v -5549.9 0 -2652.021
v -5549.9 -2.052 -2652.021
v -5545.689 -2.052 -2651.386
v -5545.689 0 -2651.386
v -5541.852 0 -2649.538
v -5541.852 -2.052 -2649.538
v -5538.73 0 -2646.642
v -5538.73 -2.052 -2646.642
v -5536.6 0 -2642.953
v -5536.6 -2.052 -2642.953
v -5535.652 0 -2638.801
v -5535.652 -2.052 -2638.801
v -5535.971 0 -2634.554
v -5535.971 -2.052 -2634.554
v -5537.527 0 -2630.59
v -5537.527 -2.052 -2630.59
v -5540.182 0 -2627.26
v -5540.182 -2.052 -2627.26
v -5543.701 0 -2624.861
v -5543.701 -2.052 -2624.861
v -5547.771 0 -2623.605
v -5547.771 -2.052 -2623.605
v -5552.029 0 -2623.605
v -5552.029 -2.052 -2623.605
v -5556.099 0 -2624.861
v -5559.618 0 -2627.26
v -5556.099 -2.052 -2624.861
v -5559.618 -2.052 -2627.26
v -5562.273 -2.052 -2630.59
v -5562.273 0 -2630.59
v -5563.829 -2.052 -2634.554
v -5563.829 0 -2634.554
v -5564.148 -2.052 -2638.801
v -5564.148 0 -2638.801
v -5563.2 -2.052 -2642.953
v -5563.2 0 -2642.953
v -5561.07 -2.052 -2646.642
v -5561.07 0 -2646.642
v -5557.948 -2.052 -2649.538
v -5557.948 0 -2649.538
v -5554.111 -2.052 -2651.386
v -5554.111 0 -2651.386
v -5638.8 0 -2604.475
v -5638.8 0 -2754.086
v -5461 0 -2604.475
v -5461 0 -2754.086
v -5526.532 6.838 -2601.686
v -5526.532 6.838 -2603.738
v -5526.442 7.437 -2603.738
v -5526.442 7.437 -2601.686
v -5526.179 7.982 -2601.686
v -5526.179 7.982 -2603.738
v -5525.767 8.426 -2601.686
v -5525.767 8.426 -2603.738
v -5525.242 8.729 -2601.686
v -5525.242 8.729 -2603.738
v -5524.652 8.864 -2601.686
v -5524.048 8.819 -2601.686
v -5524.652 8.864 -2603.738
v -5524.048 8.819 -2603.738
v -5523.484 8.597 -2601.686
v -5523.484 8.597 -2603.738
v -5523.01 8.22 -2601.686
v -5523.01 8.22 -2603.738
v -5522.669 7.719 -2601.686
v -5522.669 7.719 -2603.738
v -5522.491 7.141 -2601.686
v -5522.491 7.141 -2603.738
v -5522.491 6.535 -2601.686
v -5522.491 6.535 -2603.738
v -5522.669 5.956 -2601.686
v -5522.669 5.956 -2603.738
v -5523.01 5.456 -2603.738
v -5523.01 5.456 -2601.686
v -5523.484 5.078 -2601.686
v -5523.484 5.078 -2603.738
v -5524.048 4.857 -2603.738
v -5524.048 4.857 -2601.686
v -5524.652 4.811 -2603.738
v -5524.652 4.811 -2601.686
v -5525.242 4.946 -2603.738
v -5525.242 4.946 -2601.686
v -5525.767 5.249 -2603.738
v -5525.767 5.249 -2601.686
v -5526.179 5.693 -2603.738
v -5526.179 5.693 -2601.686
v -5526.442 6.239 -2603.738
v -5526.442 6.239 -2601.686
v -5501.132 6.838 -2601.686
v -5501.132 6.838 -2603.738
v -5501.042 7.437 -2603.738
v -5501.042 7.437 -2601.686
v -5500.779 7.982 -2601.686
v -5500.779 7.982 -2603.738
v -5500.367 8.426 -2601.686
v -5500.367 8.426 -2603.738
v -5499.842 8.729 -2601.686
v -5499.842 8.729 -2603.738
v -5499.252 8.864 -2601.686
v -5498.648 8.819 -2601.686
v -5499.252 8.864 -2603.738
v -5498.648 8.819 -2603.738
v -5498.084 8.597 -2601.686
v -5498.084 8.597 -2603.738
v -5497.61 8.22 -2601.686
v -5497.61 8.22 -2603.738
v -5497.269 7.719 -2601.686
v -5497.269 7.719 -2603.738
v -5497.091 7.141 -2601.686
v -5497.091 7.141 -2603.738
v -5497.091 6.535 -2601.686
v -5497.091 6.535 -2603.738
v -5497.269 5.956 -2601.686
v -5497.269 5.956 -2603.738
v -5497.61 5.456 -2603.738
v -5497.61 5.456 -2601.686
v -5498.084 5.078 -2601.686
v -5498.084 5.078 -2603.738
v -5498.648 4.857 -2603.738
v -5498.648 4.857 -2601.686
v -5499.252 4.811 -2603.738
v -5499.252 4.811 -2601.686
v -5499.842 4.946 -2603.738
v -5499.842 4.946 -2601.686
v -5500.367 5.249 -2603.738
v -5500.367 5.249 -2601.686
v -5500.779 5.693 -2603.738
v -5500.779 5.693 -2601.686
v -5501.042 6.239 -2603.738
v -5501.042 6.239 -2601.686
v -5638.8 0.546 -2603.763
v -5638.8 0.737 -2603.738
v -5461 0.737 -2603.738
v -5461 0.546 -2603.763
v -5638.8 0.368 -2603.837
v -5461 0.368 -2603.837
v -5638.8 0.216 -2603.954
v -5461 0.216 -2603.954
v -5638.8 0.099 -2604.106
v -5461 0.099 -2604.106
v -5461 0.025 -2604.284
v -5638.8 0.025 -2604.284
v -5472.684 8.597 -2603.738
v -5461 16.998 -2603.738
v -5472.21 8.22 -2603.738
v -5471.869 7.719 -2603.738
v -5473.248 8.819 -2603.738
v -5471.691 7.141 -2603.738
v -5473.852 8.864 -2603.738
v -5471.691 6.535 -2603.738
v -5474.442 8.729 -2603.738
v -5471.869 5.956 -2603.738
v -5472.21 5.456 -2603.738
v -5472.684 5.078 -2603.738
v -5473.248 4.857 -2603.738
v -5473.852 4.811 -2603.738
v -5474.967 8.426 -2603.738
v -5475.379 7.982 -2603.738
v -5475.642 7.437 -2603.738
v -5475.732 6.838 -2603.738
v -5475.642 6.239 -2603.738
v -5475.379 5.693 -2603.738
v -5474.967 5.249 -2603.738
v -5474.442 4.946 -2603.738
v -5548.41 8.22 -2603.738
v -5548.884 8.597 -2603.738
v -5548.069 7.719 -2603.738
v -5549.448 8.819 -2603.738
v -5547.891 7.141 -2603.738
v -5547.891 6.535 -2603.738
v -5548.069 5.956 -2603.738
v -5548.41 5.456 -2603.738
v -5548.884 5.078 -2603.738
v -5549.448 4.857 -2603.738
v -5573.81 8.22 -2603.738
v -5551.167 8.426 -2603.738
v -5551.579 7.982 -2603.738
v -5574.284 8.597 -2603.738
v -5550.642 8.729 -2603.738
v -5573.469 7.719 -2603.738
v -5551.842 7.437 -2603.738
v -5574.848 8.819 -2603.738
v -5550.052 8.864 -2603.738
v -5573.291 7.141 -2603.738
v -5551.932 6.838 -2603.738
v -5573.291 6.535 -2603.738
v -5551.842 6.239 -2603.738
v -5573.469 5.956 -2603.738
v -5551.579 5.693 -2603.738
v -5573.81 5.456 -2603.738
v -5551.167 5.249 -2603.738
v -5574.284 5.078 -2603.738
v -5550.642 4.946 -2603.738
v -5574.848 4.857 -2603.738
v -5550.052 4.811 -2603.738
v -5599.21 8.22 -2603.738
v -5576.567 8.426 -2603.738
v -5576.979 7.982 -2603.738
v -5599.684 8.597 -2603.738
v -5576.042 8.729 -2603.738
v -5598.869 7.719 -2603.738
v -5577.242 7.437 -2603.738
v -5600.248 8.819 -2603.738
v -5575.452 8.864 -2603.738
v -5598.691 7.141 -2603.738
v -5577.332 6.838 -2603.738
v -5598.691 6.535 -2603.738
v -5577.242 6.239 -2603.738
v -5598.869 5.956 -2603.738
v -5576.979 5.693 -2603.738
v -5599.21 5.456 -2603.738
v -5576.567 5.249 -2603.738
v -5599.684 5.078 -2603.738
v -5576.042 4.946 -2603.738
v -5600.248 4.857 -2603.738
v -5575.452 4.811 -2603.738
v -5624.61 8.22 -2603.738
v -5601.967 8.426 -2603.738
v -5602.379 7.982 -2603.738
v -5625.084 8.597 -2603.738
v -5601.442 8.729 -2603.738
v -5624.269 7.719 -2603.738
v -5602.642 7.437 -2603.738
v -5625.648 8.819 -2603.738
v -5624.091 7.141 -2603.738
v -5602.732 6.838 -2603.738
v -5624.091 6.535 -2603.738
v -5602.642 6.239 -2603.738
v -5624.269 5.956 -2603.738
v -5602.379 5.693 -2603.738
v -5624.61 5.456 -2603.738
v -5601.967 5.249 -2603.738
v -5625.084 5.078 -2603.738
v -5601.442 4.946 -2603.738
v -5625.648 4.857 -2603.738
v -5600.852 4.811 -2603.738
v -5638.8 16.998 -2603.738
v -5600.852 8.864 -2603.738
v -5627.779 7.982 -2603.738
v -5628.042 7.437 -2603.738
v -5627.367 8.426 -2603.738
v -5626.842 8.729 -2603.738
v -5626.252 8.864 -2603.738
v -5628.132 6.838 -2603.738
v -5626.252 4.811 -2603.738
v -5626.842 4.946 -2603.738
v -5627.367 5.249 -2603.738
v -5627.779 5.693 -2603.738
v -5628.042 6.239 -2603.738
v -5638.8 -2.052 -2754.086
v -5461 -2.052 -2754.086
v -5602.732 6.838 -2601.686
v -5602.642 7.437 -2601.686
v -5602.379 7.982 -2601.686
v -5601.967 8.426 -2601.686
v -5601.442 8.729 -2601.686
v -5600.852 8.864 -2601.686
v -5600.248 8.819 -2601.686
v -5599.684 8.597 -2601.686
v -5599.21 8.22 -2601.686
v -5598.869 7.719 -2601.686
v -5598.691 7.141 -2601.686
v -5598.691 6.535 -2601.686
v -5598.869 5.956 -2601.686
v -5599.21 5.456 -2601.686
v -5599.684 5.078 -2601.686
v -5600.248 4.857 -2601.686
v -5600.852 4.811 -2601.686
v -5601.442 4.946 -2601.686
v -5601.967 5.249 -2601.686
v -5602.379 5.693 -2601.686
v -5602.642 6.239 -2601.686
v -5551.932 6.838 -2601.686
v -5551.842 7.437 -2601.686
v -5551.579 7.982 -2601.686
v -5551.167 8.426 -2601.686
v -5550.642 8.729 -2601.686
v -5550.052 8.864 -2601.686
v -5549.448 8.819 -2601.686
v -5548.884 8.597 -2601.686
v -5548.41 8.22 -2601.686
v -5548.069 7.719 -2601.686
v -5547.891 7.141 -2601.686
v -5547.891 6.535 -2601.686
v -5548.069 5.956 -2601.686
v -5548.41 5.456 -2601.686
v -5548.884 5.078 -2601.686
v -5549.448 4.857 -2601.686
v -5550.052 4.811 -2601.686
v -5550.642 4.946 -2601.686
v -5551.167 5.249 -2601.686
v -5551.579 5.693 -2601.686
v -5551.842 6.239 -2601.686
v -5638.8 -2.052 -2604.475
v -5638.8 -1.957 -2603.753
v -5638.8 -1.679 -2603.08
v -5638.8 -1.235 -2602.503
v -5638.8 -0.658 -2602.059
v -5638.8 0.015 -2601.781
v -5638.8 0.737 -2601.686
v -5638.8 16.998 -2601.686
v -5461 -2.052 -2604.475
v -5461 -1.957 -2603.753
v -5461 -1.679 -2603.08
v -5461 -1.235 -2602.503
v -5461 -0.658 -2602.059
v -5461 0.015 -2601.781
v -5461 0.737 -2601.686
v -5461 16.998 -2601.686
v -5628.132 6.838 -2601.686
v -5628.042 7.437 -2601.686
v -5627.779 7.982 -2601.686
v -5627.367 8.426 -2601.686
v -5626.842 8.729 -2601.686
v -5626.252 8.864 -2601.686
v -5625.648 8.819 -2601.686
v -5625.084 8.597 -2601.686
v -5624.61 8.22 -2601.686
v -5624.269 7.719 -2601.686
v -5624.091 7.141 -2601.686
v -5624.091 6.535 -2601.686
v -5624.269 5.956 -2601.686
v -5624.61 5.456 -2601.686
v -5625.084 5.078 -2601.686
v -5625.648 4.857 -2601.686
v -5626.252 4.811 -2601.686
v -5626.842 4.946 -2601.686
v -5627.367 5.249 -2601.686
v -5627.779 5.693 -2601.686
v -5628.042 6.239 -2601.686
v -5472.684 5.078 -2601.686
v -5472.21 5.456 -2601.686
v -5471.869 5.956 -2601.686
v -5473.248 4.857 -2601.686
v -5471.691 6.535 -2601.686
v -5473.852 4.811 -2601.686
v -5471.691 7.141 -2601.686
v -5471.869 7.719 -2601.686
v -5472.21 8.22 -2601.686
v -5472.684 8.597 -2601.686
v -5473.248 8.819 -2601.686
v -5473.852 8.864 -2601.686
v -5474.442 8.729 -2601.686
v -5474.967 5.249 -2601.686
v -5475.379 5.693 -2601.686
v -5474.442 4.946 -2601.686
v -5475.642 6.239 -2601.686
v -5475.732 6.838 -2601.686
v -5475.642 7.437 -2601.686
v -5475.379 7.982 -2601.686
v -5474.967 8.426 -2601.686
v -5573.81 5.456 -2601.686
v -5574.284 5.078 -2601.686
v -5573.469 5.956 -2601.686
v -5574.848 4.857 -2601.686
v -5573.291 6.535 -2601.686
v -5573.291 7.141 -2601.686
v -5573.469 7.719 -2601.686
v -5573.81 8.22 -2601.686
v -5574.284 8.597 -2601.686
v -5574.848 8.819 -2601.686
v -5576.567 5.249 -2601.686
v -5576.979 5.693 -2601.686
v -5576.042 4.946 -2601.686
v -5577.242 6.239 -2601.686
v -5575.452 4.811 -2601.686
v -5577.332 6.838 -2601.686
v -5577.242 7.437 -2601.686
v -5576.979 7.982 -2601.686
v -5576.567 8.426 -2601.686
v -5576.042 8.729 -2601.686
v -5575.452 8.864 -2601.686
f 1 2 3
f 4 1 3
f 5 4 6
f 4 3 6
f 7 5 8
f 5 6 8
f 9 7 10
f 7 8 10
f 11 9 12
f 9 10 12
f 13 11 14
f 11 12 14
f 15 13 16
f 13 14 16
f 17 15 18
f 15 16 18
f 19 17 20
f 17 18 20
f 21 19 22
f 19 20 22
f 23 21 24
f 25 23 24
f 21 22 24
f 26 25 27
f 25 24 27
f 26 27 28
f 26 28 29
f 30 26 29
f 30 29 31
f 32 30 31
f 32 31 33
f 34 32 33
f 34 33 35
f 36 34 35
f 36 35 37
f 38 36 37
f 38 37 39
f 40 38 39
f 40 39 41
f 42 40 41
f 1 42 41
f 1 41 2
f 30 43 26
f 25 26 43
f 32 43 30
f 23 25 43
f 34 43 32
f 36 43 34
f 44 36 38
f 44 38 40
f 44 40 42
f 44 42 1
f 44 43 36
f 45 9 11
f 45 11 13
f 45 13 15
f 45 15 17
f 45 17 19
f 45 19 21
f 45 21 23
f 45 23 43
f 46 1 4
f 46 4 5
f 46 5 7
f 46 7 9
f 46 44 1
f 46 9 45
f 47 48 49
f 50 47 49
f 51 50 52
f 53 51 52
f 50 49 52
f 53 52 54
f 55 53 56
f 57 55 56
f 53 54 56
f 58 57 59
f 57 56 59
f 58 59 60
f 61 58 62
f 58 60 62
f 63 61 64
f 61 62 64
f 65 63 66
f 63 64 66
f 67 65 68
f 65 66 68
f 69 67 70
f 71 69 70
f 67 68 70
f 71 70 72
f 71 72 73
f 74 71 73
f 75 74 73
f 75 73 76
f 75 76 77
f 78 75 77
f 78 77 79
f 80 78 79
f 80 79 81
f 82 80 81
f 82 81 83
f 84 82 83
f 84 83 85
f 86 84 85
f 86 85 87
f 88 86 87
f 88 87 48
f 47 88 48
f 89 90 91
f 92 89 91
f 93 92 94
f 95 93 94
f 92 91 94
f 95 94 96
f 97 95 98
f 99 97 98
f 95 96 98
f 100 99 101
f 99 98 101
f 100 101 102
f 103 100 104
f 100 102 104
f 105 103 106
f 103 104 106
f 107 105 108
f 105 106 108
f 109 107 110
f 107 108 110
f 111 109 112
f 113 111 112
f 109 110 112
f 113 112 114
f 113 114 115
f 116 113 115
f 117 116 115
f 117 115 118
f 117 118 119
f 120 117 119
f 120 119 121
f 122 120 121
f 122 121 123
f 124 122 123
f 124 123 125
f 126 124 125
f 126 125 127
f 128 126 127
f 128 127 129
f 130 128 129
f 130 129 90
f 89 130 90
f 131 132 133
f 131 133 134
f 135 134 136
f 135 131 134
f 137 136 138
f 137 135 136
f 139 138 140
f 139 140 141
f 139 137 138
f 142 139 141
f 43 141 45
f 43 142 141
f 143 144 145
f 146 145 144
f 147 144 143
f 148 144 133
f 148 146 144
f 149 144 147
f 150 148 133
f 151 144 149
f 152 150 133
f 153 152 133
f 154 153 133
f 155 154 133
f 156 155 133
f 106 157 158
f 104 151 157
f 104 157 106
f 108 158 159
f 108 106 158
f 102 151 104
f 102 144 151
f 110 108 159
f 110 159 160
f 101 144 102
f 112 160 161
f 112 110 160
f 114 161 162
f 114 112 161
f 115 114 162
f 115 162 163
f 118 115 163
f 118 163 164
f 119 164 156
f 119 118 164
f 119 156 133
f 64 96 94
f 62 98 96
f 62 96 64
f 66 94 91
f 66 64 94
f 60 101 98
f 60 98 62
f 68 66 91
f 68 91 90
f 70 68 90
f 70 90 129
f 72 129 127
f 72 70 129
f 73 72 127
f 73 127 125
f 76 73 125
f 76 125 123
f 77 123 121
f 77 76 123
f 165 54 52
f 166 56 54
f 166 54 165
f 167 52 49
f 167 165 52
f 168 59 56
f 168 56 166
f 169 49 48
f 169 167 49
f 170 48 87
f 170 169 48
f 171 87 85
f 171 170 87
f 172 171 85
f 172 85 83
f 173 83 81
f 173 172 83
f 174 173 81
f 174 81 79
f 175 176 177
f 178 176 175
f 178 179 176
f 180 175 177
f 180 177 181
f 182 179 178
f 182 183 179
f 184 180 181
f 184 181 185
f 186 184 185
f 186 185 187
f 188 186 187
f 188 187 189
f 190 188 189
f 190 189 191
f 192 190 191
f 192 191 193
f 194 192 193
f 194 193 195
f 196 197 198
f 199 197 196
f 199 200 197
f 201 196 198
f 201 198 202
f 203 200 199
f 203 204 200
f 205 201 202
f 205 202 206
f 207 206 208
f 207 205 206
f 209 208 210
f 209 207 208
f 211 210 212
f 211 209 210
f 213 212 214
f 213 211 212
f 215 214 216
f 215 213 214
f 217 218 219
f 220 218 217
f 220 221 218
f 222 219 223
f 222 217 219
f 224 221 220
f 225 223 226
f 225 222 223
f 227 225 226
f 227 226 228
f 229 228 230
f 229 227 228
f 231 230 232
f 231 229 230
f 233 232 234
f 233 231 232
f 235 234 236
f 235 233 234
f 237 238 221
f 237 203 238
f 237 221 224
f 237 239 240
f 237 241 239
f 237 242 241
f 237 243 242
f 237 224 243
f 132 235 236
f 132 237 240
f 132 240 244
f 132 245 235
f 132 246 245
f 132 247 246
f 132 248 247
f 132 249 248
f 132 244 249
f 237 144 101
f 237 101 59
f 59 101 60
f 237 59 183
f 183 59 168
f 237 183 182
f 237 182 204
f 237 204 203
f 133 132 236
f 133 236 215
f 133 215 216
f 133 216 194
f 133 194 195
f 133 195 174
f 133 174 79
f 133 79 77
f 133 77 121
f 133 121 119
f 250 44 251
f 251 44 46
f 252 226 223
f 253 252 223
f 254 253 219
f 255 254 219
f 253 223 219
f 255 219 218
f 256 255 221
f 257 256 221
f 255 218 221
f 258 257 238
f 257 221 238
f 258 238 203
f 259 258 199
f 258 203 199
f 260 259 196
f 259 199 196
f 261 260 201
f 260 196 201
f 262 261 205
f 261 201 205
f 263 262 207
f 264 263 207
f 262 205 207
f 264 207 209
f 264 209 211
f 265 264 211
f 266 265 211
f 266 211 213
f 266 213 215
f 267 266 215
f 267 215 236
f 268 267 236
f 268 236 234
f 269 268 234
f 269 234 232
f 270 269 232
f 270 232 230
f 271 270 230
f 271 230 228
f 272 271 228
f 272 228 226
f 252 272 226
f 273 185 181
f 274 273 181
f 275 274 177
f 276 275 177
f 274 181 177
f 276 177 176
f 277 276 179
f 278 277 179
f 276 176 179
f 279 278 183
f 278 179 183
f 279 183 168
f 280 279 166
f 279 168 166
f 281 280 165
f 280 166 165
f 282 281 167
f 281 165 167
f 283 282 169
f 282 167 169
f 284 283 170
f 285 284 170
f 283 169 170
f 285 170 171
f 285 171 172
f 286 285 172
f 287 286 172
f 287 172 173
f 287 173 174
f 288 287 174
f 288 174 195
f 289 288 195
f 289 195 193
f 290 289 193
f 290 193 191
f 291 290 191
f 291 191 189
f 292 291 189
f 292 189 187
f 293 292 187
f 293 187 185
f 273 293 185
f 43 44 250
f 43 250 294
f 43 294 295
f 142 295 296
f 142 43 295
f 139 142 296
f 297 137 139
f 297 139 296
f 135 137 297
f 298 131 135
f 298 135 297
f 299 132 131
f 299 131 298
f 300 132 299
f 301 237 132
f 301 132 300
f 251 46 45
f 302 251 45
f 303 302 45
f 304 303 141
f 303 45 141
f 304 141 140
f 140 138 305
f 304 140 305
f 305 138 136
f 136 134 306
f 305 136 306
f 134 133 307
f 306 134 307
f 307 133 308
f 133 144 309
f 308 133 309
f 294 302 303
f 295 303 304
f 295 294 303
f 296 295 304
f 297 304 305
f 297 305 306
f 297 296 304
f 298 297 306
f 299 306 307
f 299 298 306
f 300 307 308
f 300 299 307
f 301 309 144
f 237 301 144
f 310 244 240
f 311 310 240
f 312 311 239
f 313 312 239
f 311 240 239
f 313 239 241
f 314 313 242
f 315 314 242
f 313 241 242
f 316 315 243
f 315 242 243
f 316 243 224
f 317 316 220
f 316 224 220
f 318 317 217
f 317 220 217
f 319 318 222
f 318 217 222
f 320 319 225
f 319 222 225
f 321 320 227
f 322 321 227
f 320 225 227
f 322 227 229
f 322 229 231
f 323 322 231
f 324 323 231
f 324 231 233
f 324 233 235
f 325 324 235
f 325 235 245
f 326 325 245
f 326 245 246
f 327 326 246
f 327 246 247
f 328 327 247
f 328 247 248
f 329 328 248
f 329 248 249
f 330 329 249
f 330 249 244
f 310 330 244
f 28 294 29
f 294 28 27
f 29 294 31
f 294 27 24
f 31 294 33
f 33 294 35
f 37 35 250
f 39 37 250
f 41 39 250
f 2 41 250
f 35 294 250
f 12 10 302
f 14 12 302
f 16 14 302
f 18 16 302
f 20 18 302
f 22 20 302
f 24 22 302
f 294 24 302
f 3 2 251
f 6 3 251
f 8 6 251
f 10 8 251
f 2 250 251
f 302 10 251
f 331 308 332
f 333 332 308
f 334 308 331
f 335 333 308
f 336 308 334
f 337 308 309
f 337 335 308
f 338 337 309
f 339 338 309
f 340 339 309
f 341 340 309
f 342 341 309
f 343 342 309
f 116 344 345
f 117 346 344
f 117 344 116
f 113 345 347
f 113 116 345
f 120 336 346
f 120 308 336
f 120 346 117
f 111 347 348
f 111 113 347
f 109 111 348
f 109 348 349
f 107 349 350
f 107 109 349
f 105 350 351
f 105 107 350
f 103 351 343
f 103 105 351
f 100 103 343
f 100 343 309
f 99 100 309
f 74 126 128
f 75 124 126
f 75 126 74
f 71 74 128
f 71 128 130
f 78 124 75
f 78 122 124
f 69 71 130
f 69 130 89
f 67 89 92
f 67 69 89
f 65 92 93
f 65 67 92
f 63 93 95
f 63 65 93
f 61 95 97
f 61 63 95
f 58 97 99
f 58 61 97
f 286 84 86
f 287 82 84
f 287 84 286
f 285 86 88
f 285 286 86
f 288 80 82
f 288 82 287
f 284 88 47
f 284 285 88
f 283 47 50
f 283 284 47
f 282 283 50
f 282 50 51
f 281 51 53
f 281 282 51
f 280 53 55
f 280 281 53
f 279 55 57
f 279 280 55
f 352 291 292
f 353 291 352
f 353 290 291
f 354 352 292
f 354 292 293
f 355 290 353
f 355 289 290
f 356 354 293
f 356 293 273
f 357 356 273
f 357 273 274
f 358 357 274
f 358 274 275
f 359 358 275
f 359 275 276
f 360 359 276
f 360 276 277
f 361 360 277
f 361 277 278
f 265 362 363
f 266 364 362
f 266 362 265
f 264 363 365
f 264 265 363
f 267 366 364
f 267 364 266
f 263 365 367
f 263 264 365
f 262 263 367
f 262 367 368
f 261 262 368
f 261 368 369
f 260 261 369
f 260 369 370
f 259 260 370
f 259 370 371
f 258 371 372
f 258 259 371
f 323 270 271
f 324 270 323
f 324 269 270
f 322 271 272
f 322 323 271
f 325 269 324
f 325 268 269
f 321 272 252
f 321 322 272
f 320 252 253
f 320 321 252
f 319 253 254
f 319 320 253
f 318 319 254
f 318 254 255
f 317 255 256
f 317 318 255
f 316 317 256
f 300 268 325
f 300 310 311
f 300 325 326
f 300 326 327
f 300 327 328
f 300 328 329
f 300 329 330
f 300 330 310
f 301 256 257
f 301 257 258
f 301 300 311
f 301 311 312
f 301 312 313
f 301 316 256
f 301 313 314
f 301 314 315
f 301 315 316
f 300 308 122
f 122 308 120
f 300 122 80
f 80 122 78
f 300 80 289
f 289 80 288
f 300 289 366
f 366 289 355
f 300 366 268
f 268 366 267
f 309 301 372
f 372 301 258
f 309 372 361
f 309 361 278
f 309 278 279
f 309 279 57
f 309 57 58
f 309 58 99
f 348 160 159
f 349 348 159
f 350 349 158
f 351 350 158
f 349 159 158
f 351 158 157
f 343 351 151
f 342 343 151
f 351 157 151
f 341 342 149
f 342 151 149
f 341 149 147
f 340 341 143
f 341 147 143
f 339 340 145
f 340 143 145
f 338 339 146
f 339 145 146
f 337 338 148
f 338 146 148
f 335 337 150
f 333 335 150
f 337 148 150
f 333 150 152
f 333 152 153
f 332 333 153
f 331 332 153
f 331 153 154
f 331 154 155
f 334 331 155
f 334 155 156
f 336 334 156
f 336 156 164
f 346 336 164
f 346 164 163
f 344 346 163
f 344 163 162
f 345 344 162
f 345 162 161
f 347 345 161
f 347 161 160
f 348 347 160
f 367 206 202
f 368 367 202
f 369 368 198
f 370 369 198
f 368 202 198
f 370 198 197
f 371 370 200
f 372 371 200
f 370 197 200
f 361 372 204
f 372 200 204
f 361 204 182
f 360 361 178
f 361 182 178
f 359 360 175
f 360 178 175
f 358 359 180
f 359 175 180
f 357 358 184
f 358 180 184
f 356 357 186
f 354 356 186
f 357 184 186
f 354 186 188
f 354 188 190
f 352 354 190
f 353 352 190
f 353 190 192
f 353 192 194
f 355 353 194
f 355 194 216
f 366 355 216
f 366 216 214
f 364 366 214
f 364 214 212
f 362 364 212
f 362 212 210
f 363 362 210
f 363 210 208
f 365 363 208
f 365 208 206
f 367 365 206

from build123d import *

# Parameters (mm, degrees)
SKETCH1_W                    = 177.8
SKETCH1_H                    = 152.4
BASE_FLANGE1_DEPTH           = 2.05232
EDGE_FLANGE1_STRIP_W         = 9.68248
EDGE_FLANGE1_STRIP_H         = 2.05232
EDGE_FLANGE1_STRIP_CUT_DEPTH = 177.8
EDGE_FLANGE1_DEPTH           = 177.8
SKETCH9_R                    = 2.032
CUT_EXTRUDE1_DEPTH           = 2.54
SKETCH10_R                   = 14.2875
CUT_EXTRUDE2_DEPTH           = 2.54


# Sheet-metal steps are written as plain solids
with BuildPart() as part:
    # Sketch1 → Base-Flange1 (new body)
    with BuildSketch(Plane(origin=(0, 0, 0), x_dir=(1, 0, 0), z_dir=(0, 1, 0))):
        with Locations((-5549.9, 2677.885714286)):
            Rectangle(SKETCH1_W, SKETCH1_H)
    extrude(amount=-BASE_FLANGE1_DEPTH)

    # Edge-Flange1 strip (across the edge) → Edge-Flange1 strip cut (cut)
    with BuildSketch(Plane(origin=(-5638.8, 0, -2601.685714286), x_dir=(0, 0, -1), z_dir=(1, 0, 0))):
        with Locations((-2.05232, -1.02616)):
            Rectangle(EDGE_FLANGE1_STRIP_W, EDGE_FLANGE1_STRIP_H)
    extrude(amount=EDGE_FLANGE1_STRIP_CUT_DEPTH, mode=Mode.SUBTRACT)

    # Edge-Flange1 section (across the edge) → Edge-Flange1 (add)
    with BuildSketch(Plane(origin=(-5638.8, 0, -2601.685714286), x_dir=(0, 0, -1), z_dir=(1, 0, 0))):
        with BuildLine():
            Line((0, 0.7366), (0, 16.99768))
            Line((0, 16.99768), (2.05232, 16.99768))
            Line((2.05232, 16.99768), (2.05232, 0.7366))
            ThreePointArc((2.05232, 0.7366), (2.268065145, 0.215745145), (2.78892, 0))
            Line((2.78892, 0), (2.78892, -2.05232))
            ThreePointArc((2.78892, -2.05232), (0.816855756, -1.235464244), (0, 0.7366))
        make_face()
    extrude(amount=EDGE_FLANGE1_DEPTH)

    # Sketch9 → Cut-Extrude1 (cut)
    with BuildSketch(Plane(origin=(0, 0, -2603.738034286), x_dir=(-1, 0, 0), z_dir=(0, 0, -1))):
        with Locations((5626.1, 6.83768)):
            Circle(SKETCH9_R)
        with Locations((5600.7, 6.83768)):
            Circle(SKETCH9_R)
        with Locations((5575.3, 6.83768)):
            Circle(SKETCH9_R)
        with Locations((5549.9, 6.83768)):
            Circle(SKETCH9_R)
        with Locations((5524.5, 6.83768)):
            Circle(SKETCH9_R)
        with Locations((5499.1, 6.83768)):
            Circle(SKETCH9_R)
        with Locations((5473.7, 6.83768)):
            Circle(SKETCH9_R)
    extrude(amount=-CUT_EXTRUDE1_DEPTH, mode=Mode.SUBTRACT)

    # Sketch10 → Cut-Extrude2 (cut)
    with BuildSketch(Plane.XZ.offset(2.05232)):
        with Locations(Location((-5549.9, -2637.733394286, 0), (0, 0, 270))):
            Circle(SKETCH10_R)
    extrude(amount=-CUT_EXTRUDE2_DEPTH, mode=Mode.SUBTRACT)


solid = part.part
